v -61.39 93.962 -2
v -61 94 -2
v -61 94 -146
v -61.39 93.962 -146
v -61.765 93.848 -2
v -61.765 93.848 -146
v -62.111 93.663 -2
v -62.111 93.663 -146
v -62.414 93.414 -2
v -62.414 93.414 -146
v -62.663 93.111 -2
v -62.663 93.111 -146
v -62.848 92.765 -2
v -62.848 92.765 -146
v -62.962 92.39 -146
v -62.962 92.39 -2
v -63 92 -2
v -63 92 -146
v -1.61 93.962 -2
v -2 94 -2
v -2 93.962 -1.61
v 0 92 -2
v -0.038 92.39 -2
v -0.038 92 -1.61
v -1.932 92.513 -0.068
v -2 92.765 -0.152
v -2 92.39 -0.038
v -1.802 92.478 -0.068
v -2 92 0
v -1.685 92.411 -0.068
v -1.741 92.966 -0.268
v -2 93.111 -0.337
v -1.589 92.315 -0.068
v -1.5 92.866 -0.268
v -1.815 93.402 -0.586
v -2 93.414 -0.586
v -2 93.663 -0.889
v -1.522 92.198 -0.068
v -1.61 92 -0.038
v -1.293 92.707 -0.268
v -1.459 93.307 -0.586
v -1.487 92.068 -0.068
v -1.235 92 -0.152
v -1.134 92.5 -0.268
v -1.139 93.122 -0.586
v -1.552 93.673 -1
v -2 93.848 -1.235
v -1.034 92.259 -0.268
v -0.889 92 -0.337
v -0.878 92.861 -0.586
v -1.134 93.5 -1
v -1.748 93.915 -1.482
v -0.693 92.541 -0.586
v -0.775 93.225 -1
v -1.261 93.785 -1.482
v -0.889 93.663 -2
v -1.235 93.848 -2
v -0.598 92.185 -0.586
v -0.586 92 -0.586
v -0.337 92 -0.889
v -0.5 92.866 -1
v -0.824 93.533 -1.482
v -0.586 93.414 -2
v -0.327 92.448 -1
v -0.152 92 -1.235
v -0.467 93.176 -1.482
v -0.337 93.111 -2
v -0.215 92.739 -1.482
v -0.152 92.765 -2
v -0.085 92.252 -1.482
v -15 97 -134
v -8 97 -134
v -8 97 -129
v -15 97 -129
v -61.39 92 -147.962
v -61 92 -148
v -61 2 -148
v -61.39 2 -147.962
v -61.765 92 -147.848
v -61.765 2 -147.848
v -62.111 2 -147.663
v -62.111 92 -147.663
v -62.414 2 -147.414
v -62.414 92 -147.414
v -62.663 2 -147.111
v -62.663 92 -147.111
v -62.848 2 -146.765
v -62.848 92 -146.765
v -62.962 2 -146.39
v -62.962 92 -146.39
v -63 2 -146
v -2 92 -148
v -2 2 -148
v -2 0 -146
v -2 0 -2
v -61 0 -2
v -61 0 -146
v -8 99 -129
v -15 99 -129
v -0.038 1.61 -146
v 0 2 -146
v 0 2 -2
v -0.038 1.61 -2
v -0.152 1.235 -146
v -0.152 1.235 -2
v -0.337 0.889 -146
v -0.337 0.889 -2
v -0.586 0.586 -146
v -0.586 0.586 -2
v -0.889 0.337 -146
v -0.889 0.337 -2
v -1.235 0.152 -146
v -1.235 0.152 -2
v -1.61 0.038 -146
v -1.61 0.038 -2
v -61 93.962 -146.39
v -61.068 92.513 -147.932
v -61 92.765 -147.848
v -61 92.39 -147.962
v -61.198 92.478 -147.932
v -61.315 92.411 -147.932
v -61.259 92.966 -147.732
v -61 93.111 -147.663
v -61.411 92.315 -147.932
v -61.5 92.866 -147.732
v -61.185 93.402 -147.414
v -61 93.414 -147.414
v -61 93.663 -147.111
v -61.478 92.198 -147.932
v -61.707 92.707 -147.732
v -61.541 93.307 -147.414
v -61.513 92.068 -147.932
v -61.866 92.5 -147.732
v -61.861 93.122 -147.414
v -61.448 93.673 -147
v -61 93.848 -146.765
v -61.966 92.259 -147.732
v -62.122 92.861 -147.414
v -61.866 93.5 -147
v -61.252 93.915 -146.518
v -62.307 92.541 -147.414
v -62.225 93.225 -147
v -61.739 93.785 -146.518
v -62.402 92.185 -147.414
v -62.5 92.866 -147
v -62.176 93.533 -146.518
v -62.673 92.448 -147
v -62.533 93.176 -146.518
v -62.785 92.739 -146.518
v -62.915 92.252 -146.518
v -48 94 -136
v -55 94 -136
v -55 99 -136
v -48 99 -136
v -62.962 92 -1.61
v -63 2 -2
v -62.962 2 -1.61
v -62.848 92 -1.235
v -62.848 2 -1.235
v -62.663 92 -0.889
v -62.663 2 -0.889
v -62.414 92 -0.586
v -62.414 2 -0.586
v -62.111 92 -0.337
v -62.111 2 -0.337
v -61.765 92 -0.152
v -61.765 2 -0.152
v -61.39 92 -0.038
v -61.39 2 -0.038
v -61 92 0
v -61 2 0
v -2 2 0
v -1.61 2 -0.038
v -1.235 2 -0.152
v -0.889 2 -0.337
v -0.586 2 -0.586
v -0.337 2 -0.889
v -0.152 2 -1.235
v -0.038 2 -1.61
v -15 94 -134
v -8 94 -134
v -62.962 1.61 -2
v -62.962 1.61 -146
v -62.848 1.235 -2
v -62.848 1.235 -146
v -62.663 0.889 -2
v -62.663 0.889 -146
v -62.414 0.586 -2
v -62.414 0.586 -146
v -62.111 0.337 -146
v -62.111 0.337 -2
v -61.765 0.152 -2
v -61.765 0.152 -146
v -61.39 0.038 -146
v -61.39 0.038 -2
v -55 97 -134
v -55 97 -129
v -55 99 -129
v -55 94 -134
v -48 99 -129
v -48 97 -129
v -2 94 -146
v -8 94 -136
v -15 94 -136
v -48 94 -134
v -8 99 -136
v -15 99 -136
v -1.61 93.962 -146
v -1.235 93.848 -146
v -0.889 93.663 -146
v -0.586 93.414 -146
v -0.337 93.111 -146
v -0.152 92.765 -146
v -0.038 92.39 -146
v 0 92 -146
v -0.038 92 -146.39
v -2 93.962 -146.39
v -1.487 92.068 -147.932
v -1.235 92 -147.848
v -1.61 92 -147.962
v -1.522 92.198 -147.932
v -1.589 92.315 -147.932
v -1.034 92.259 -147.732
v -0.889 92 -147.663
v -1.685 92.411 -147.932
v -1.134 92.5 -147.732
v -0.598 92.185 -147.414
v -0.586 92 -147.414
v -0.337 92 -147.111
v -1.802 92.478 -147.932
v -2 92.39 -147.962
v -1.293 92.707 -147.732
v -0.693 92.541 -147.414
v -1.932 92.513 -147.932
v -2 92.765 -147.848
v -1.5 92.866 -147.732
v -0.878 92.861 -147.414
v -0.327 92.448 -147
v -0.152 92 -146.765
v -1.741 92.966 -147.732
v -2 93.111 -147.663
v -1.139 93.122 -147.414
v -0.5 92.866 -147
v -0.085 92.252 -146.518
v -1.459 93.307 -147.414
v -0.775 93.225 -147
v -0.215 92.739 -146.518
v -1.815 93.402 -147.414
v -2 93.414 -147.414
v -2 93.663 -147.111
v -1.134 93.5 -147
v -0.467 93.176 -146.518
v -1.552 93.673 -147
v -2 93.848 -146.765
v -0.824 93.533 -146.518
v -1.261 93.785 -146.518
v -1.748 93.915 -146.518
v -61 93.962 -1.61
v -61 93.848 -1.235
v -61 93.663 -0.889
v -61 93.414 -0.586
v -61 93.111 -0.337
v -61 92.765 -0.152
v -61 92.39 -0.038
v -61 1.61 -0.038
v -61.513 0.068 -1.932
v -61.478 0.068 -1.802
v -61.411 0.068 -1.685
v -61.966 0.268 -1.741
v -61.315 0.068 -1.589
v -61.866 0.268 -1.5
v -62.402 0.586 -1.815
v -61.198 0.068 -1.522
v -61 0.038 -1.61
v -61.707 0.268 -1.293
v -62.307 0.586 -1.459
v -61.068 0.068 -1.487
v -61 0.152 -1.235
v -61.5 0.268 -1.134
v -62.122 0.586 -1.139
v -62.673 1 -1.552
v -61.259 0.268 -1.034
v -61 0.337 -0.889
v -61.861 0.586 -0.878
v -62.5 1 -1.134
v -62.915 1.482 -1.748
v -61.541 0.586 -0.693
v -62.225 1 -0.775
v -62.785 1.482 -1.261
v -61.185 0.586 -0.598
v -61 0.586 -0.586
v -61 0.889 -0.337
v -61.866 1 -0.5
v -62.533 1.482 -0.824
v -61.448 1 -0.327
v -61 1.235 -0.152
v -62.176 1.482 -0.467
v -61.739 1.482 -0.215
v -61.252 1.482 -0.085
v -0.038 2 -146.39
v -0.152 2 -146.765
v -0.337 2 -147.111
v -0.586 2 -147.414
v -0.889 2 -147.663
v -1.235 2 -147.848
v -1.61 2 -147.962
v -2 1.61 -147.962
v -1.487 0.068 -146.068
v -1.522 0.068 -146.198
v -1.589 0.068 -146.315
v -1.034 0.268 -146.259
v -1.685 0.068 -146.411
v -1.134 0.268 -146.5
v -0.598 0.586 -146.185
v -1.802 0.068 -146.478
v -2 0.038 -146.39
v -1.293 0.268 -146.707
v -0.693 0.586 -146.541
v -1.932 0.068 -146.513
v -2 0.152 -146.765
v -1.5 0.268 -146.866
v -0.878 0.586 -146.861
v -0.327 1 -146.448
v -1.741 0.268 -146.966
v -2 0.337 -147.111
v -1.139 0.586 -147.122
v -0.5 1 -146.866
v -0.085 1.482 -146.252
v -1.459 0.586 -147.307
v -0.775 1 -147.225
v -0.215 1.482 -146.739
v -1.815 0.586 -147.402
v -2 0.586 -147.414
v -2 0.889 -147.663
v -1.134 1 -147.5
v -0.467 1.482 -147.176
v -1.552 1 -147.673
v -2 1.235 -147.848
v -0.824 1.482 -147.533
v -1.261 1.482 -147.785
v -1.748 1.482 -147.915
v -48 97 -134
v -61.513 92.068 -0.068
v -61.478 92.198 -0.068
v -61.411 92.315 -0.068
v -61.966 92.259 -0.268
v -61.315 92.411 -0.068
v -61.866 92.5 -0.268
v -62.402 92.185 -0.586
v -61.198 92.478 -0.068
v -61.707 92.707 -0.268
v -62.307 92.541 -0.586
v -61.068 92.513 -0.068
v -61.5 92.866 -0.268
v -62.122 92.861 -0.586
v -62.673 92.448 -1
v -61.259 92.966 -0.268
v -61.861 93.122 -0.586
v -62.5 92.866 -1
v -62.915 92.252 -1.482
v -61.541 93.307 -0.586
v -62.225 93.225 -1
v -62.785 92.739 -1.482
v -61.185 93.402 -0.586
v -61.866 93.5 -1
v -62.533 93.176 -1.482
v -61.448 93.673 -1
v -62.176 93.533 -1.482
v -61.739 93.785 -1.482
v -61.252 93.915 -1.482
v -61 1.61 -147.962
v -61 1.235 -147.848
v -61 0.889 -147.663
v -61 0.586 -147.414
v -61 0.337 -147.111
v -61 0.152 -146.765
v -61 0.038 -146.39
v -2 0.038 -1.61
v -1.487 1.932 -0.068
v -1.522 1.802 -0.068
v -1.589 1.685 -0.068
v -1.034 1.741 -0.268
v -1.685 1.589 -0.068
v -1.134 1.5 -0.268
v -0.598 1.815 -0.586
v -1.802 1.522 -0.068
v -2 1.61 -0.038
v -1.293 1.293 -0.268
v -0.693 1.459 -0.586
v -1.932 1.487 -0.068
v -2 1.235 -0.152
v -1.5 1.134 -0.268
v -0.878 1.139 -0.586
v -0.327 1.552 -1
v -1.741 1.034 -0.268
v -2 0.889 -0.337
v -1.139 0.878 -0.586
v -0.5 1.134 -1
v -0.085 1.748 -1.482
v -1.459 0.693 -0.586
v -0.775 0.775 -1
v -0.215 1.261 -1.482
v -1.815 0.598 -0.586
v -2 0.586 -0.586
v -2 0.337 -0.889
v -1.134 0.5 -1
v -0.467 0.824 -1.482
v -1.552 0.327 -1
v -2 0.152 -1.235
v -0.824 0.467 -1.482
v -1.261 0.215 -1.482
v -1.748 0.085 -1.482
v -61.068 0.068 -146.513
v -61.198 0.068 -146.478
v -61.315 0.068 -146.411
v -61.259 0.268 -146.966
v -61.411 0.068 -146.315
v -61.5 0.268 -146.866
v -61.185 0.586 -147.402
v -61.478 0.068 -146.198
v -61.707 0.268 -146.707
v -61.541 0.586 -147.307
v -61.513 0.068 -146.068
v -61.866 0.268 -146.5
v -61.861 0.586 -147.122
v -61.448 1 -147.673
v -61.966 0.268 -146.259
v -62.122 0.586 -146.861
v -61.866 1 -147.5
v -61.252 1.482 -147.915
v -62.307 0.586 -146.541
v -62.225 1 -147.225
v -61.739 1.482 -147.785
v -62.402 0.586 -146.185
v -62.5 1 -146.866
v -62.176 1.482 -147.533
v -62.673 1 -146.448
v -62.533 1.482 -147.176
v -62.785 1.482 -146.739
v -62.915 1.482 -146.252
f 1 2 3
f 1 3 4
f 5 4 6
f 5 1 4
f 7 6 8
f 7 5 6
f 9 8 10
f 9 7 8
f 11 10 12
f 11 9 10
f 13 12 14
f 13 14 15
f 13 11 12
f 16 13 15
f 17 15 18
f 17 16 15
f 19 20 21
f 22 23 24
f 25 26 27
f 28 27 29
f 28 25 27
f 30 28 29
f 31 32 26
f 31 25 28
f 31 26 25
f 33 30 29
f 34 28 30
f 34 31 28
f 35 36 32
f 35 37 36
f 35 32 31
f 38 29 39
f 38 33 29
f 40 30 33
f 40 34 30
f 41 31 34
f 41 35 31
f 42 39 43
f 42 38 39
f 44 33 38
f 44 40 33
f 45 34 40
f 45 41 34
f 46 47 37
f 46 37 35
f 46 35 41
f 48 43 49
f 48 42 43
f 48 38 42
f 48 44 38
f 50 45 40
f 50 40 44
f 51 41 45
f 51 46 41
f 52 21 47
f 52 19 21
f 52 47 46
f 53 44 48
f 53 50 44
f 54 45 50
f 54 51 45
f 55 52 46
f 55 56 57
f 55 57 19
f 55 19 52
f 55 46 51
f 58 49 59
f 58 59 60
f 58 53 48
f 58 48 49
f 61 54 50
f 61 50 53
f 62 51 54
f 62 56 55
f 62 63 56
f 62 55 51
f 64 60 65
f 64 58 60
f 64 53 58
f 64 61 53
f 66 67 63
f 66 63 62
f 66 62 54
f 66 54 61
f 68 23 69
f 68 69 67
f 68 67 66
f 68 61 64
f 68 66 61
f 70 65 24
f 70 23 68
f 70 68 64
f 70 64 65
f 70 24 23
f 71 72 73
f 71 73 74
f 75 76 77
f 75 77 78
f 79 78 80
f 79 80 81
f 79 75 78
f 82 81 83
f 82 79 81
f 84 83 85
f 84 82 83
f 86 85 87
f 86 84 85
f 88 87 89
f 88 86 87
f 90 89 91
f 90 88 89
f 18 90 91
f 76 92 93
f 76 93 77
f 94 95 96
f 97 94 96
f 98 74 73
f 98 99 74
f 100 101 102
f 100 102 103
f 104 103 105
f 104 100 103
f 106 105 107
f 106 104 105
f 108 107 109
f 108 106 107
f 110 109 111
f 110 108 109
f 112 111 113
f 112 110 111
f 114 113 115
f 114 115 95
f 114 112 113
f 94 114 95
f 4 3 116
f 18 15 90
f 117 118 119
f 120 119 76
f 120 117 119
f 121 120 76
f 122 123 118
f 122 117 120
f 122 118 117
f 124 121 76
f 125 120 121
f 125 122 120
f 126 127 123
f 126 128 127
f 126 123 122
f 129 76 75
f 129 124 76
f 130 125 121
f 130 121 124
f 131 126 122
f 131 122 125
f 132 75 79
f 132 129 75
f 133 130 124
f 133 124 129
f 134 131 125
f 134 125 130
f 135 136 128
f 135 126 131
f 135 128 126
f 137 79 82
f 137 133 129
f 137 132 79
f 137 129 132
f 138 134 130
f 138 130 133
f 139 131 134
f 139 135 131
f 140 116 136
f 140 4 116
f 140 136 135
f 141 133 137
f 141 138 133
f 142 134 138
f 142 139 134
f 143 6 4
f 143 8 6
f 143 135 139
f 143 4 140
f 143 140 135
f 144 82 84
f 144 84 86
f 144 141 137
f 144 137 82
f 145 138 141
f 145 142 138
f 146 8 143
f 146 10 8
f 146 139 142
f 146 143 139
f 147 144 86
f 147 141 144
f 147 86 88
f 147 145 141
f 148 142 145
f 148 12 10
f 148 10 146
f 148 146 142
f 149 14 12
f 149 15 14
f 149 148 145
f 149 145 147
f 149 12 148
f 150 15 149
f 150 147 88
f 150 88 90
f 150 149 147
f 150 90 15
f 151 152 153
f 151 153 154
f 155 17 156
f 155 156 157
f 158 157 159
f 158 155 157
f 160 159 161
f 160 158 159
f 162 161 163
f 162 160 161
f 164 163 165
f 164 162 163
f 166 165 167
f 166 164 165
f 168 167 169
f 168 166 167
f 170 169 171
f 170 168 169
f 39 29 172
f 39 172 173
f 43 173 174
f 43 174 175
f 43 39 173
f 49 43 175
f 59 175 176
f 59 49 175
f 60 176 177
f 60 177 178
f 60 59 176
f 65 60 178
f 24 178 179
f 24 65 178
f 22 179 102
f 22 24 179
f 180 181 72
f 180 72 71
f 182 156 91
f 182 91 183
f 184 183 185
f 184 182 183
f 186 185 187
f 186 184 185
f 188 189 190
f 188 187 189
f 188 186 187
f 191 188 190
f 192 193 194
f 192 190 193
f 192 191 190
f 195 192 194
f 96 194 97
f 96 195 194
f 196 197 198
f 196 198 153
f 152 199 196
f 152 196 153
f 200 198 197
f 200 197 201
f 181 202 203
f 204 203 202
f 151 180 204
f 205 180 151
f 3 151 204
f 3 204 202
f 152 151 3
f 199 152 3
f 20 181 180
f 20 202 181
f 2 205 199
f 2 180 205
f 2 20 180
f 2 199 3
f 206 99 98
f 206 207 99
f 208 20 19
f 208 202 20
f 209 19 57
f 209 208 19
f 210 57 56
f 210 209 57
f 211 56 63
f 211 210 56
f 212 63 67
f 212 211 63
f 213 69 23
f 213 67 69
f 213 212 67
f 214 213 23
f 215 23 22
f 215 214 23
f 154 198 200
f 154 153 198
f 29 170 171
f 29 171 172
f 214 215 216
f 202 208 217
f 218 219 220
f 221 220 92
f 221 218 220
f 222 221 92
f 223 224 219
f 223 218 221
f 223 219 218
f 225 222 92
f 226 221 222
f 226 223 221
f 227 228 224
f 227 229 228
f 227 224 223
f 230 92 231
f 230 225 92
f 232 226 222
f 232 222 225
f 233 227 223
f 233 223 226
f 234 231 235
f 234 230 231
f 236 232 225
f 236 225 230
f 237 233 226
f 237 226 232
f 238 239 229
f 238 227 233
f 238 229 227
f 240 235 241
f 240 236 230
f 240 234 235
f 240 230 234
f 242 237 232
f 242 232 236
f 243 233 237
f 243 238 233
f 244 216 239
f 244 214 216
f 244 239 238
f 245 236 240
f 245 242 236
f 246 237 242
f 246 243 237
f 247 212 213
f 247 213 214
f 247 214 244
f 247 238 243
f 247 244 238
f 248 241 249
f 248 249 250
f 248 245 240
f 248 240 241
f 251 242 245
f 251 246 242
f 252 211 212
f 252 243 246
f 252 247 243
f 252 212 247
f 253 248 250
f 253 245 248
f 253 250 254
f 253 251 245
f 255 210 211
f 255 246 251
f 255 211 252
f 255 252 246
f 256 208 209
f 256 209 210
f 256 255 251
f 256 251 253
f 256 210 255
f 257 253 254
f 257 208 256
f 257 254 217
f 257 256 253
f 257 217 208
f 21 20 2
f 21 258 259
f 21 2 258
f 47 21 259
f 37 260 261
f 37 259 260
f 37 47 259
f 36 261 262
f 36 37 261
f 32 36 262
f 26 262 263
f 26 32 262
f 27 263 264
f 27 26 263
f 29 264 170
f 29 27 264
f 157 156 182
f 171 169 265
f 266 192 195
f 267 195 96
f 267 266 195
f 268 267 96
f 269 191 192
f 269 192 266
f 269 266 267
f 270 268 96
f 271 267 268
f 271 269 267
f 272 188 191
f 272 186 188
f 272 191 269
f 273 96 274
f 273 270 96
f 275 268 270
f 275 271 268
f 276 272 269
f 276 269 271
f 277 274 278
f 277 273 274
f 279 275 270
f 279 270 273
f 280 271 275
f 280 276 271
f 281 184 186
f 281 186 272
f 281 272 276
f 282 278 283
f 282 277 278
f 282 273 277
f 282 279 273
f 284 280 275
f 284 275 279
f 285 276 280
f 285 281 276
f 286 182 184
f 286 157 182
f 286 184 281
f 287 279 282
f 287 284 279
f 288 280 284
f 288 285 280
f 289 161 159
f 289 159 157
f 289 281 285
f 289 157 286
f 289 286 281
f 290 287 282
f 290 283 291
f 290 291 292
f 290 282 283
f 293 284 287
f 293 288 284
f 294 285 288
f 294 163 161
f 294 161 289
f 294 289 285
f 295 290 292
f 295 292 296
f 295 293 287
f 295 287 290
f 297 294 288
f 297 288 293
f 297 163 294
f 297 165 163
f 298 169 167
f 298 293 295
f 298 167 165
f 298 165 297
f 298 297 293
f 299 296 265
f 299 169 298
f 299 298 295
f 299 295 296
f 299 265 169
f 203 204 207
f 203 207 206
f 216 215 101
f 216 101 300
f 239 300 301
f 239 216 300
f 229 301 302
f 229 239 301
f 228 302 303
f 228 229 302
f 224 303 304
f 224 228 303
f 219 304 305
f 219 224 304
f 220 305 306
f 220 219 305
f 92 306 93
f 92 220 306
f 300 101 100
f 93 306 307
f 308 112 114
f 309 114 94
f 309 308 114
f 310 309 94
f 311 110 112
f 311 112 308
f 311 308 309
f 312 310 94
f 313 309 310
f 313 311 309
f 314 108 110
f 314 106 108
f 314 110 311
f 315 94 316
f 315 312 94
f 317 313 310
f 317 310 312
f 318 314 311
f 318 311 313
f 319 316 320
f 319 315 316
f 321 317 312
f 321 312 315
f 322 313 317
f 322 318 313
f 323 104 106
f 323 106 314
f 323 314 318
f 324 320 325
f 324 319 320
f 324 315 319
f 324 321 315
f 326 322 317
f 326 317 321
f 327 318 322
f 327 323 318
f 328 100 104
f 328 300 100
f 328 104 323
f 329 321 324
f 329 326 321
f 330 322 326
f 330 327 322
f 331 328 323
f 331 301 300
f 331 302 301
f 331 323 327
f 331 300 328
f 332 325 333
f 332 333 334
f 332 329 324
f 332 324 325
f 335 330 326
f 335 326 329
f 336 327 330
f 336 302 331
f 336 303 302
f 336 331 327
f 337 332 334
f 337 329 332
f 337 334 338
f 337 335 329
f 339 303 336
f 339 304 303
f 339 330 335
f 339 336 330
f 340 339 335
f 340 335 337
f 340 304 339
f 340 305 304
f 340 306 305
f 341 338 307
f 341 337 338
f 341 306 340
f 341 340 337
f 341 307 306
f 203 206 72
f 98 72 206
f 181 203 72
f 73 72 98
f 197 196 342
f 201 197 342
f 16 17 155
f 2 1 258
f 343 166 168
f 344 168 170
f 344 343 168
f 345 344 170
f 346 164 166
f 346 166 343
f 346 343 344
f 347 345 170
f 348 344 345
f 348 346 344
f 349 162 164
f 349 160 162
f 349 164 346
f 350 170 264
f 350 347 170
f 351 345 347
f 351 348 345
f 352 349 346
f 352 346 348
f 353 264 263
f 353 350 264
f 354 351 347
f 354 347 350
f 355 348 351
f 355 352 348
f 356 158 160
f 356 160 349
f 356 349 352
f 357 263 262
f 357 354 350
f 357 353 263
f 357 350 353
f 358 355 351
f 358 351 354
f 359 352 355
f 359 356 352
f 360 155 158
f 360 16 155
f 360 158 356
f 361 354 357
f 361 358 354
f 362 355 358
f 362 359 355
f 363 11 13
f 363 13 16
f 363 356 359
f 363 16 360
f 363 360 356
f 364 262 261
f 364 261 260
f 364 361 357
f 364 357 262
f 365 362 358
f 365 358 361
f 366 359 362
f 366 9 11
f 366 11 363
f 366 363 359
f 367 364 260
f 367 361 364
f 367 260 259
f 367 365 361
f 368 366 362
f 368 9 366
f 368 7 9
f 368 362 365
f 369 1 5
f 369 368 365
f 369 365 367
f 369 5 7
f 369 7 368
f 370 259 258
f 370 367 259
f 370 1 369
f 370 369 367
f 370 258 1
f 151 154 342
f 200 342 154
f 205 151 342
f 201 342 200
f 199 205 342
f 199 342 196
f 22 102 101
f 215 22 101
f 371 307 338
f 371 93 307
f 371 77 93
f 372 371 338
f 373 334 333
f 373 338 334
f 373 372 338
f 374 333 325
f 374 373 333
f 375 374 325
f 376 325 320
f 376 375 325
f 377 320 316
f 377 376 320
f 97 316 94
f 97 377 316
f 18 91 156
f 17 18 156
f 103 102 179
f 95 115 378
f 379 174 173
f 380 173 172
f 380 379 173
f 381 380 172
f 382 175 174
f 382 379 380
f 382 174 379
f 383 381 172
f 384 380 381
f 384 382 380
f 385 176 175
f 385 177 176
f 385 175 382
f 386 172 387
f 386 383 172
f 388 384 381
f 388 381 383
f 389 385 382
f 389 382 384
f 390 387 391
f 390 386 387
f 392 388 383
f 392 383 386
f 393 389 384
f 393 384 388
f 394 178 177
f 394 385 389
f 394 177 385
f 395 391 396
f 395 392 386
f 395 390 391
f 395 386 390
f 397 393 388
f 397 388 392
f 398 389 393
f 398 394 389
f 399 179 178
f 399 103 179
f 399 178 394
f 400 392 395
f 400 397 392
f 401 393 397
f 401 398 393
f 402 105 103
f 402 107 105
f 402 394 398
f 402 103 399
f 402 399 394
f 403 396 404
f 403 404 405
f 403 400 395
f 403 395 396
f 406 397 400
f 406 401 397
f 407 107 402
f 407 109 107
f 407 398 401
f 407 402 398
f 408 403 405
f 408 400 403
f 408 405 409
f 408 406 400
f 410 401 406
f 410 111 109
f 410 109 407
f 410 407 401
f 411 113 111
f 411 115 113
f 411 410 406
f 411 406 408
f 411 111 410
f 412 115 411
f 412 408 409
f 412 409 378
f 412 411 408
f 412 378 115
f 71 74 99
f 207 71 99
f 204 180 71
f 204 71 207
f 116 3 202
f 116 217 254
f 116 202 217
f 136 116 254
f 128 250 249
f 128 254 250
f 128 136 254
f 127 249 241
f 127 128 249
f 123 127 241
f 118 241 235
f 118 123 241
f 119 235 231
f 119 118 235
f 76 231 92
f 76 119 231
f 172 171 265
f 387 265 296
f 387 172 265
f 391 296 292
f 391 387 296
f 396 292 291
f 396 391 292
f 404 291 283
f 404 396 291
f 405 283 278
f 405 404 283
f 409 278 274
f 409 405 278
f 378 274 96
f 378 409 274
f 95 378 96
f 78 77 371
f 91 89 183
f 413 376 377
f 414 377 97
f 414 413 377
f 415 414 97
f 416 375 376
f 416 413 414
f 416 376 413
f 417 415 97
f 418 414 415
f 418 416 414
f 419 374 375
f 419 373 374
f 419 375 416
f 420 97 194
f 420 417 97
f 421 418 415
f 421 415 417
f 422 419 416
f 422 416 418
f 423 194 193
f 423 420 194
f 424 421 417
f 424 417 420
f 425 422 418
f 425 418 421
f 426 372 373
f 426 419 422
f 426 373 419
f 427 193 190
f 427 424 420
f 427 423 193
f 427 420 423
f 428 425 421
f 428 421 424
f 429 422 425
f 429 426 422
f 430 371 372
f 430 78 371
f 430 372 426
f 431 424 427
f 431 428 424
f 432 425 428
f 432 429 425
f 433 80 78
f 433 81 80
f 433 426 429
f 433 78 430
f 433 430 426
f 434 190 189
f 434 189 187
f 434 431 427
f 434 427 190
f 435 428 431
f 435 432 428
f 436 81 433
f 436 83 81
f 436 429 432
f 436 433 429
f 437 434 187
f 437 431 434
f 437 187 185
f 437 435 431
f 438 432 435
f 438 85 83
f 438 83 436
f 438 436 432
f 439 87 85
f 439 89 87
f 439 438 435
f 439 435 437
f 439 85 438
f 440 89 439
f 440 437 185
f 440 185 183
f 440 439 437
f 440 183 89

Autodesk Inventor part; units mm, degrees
ref_plane "YZ Plane" through (0, 0, 0) normal (1, 0, 0) x (0, 1, 0)
ref_plane "XZ Plane" through (0, 0, 0) normal (0, 1, 0) x (-1, 0, 0)
ref_plane "XY Plane" through (0, 0, 0) normal (0, 0, 1) x (1, 0, 0)
sketch "Sketch1" plane through (0, 0, 0) normal (0, 1, 0) x (-1, 0, 0)
  line L0 (0, 0) -> (0, -148)
  line L1 (0, -148) -> (63, -148)
  line L2 (63, -148) -> (63, 0)
  line L3 (63, 0) -> (0, 0)
  dimension "d0" = 148
  dimension "d1" = 63
extrude "Extrusion1" add sketch "Sketch1" along normal blind 94
sketch "Sketch2" plane through (0, 94, 0) normal (0, 1, 0) x (1, 0, 0)
  line L0 (0, 148) -> (-63, 148) projected
  line L1 (-63, 148) -> (-63, 136)
  line L2 (-63, 148) -> (-63, 0) projected
  line L3 (-63, 136) -> (-55, 136)
  line L4 (-55, 136) -> (-48, 136)
  line L5 (-48, 136) -> (-48, 134)
  line L6 (-48, 134) -> (-55, 134)
  line L7 (-55, 134) -> (-55, 136)
  line L8 (0, 0) -> (0, 148) projected
  line L9 (0, 148) -> (0, 136)
  line L10 (0, 136) -> (-8, 136)
  line L11 (-8, 136) -> (-8, 134)
  line L12 (-8, 134) -> (-15, 134)
  line L13 (-15, 134) -> (-15, 136)
  line L14 (-15, 136) -> (-8, 136)
  dimension "d4" = 12
  dimension "d5" = 8
  dimension "d6" = 7
  dimension "d7" = 2
  dimension "d8" = 12
  dimension "d9" = 8
  dimension "d10" = 2
  dimension "d11" = 7
extrude "Extrusion2" add sketch "Sketch2" along normal blind 5
sketch "Sketch3" plane through (-55, 94, -134) normal (0, 0, 1) x (1, 0, 0)
  line L0 (0, 5) -> (7, 5) projected
  line L1 (0, 5) -> (0, 3)
  line L2 (0, 0) -> (0, 5) projected
  line L3 (0, 3) -> (7, 3)
  line L4 (7, 0) -> (7, 5) projected
  line L5 (7, 5) -> (0, 5)
  line L6 (7, 5) -> (7, 3)
  line L7 (40, 5) -> (47, 5) projected
  line L8 (40, 5) -> (47, 5)
  line L9 (47, 5) -> (47, 3)
  line L10 (47, 0) -> (47, 5) projected
  line L11 (47, 3) -> (40, 3)
  line L12 (40, 0) -> (40, 5) projected
  line L13 (40, 5) -> (40, 3)
  point P0 (55, -94)
  dimension "d14" = 2
  dimension "d15" = 2
extrude "Extrusion3" add sketch "Sketch3" along normal blind 5
fillet "Fillet1" radius 2 12 edges at (0, 94, -74) (-63, 94, -74) (-31.5, 94, -148) (0, 47, -148) (-63, 47, -148) (0, 0, -74) (-31.5, 0, -148) (0, 47, 0) (-31.5, 94, 0) (-63, 47, 0) (-31.5, 0, 0) (-63, 0, -74)
properties part number "battery"
